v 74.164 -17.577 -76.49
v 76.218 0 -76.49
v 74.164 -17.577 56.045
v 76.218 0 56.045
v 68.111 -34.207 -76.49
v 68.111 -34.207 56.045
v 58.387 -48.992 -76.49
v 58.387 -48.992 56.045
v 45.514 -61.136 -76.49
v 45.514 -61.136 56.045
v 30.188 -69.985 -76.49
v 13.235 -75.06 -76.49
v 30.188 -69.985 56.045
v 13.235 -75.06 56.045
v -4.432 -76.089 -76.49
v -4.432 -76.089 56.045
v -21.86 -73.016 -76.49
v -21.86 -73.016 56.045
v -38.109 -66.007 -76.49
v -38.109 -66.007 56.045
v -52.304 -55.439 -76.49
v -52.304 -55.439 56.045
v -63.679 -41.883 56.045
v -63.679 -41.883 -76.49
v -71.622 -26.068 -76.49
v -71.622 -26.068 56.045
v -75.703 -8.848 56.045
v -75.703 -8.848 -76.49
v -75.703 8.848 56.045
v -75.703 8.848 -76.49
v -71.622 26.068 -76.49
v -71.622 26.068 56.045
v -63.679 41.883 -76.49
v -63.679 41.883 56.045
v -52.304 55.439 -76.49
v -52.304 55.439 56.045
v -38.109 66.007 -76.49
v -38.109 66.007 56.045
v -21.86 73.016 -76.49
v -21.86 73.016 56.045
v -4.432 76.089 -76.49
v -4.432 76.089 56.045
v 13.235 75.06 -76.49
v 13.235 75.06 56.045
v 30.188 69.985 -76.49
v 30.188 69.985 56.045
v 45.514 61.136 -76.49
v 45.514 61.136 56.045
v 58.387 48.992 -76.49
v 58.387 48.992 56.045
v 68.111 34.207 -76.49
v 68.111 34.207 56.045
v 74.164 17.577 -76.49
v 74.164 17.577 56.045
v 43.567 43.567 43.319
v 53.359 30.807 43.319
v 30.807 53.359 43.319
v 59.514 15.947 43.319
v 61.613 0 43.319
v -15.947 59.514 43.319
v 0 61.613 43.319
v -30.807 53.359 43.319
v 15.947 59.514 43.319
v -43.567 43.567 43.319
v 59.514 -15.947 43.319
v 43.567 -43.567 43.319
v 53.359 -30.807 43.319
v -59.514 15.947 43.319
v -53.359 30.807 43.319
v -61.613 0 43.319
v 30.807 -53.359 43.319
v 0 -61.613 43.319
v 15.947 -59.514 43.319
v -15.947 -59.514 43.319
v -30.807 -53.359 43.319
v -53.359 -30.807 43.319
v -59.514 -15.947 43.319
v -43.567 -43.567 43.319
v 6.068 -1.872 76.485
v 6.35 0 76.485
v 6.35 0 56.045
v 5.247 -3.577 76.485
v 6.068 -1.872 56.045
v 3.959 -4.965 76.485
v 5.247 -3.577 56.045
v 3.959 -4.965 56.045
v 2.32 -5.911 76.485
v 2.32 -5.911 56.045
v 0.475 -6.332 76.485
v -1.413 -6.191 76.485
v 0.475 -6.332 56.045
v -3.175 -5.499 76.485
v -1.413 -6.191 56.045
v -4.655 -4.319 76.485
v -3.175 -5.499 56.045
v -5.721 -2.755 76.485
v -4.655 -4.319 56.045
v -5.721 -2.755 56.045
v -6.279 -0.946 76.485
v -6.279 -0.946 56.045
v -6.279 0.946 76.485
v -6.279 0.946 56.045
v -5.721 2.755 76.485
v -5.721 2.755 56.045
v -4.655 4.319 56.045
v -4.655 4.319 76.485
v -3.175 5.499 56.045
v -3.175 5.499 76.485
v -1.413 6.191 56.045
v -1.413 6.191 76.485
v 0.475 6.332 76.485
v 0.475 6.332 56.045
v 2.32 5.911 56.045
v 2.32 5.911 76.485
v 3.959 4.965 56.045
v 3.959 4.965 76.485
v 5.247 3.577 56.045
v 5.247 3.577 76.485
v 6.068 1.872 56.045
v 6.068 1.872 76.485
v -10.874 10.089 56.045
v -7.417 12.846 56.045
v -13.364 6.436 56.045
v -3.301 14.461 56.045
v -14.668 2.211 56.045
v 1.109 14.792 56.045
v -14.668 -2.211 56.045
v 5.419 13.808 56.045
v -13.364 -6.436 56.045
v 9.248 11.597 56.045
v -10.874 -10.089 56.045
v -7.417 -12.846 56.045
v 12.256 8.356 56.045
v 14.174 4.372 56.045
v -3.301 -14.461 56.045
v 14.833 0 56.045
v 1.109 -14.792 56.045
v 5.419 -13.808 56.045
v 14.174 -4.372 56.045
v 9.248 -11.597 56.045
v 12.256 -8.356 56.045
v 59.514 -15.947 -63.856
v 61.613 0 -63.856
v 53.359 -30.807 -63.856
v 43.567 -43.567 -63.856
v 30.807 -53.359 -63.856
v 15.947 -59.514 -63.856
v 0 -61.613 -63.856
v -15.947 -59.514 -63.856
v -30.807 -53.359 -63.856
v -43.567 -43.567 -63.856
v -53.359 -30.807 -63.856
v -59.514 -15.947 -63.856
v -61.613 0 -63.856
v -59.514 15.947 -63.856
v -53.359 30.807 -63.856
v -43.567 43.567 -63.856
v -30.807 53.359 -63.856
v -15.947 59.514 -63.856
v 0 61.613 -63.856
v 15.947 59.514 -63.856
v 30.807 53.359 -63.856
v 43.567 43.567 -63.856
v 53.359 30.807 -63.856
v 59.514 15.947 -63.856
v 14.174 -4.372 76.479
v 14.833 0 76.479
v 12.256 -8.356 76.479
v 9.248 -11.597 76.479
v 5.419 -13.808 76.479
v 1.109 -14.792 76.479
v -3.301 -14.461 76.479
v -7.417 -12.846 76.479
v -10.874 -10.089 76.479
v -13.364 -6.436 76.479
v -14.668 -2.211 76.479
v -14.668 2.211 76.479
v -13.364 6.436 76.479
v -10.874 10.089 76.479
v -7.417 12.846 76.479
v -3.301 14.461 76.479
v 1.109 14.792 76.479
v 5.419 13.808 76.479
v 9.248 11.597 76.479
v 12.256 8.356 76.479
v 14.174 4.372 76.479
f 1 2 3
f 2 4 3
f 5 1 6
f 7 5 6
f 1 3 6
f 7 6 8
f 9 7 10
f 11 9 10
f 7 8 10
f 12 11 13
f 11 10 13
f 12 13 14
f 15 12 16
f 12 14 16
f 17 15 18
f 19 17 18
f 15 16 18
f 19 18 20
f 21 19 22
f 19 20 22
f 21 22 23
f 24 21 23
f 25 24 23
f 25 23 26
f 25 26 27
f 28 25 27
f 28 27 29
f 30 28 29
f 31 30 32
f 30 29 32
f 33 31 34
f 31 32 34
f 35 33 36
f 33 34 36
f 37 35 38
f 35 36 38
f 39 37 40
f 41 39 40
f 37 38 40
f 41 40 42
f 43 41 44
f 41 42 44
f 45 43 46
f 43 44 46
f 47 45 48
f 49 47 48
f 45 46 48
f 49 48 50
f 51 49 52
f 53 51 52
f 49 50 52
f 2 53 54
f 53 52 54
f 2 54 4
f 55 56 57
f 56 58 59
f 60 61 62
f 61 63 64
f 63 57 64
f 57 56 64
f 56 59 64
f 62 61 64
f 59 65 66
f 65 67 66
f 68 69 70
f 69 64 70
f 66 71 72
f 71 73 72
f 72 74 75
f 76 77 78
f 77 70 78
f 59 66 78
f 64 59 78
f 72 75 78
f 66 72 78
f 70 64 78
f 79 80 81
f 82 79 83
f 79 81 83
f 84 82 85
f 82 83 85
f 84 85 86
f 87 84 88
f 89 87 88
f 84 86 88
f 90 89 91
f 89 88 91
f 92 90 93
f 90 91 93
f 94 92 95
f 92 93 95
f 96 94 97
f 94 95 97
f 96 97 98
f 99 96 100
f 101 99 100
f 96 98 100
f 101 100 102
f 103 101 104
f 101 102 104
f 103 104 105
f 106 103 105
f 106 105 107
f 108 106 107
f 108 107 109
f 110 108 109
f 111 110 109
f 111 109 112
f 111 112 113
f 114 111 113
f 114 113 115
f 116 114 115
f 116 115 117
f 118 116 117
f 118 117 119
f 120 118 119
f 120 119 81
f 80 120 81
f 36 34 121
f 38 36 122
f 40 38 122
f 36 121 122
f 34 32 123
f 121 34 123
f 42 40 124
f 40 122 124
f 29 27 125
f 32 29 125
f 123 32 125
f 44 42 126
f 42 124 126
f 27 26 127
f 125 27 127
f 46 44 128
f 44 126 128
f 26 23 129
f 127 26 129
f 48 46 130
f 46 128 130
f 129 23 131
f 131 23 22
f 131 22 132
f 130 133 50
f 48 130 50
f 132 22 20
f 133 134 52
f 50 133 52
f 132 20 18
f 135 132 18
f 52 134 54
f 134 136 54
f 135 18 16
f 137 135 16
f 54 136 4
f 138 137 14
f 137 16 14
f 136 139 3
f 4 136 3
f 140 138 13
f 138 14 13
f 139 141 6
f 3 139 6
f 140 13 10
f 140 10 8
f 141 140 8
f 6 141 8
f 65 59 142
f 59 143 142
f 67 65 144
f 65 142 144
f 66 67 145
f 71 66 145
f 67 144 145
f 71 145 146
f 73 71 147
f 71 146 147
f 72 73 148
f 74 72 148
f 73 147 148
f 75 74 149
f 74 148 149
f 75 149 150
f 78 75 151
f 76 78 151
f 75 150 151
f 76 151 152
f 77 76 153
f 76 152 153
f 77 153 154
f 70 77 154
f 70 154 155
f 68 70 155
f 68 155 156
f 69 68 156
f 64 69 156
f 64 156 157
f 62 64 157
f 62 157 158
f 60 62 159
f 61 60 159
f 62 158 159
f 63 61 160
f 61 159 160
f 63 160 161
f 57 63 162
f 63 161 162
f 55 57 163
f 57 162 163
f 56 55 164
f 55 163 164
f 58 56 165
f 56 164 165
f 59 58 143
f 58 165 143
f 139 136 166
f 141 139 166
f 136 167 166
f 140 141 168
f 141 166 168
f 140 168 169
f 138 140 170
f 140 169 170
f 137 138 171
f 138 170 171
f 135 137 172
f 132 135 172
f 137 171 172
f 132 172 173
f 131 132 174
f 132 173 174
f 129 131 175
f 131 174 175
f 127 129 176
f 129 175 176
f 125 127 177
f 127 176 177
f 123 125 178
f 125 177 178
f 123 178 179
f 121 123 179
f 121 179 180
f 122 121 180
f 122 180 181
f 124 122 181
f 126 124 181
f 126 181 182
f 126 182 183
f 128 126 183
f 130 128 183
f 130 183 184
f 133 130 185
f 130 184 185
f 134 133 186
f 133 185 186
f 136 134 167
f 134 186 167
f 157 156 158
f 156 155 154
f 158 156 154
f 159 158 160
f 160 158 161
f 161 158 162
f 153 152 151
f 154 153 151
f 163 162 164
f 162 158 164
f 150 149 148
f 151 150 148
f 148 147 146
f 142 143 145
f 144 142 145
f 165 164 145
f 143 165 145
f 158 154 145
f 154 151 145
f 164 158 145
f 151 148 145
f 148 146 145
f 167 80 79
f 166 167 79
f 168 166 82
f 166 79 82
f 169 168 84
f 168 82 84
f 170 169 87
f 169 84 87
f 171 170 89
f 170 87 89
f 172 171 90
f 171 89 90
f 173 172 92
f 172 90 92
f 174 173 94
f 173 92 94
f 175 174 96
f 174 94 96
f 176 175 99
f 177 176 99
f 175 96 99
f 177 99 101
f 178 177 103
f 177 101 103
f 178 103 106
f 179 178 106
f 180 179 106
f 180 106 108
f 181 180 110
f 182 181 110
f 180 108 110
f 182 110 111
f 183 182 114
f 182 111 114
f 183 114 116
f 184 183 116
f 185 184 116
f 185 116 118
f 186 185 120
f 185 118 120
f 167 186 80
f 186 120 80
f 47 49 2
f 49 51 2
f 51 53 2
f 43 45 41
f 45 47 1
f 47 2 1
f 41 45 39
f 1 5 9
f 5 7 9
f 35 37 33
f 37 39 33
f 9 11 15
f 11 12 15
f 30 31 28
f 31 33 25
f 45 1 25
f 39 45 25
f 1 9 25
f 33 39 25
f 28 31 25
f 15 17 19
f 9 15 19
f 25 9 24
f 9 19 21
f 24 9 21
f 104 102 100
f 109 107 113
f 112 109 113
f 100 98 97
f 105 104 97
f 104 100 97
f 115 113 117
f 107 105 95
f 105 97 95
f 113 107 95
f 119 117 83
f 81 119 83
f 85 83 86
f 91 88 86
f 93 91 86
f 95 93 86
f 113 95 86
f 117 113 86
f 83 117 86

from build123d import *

# Parameters (mm, degrees)
F3_D     = 12.7
F3_DEPTH = 101.6
F3_TIP   = 3.8154649308


with BuildPart() as f1:
    # F0 (on Front) → F1 (revolve)
    with BuildSketch(Plane.XZ):
        Polygon((14.8333879188, 76.4790847898), (0, 76.4899104834), (0, 43.3194376528), (61.6134181619, 43.3194376528), (61.6134181619, -63.8560429215), (0, -63.8560429215), (0, -76.4899104834), (76.2181654572, -76.4899104834), (76.2181654572, 56.0453906655), (14.8333879188, 56.0453906655), align=None)
    revolve(axis=Axis((0, 0, 0), (0, 0, -1)))

    # F3 (one way)
    with BuildSketch(Plane(origin=(0, 0, 56.0453906655), x_dir=(1, 0, 0), z_dir=(0, 0, -1))):
        with Locations((0, 0)):
            Circle(F3_D / 2)
    extrude(amount=-F3_DEPTH, mode=Mode.SUBTRACT)
    with Locations(Plane(origin=(0, 0, 56.0453906655), x_dir=(1, 0, 0), z_dir=(0, 0, -1))):
        with Locations((0, 0)):
            with Locations((0, 0, -(F3_DEPTH + F3_TIP / 2))):  # 118° drill point
                Cone(0, F3_D / 2, F3_TIP, mode=Mode.SUBTRACT)


solid = f1.part
